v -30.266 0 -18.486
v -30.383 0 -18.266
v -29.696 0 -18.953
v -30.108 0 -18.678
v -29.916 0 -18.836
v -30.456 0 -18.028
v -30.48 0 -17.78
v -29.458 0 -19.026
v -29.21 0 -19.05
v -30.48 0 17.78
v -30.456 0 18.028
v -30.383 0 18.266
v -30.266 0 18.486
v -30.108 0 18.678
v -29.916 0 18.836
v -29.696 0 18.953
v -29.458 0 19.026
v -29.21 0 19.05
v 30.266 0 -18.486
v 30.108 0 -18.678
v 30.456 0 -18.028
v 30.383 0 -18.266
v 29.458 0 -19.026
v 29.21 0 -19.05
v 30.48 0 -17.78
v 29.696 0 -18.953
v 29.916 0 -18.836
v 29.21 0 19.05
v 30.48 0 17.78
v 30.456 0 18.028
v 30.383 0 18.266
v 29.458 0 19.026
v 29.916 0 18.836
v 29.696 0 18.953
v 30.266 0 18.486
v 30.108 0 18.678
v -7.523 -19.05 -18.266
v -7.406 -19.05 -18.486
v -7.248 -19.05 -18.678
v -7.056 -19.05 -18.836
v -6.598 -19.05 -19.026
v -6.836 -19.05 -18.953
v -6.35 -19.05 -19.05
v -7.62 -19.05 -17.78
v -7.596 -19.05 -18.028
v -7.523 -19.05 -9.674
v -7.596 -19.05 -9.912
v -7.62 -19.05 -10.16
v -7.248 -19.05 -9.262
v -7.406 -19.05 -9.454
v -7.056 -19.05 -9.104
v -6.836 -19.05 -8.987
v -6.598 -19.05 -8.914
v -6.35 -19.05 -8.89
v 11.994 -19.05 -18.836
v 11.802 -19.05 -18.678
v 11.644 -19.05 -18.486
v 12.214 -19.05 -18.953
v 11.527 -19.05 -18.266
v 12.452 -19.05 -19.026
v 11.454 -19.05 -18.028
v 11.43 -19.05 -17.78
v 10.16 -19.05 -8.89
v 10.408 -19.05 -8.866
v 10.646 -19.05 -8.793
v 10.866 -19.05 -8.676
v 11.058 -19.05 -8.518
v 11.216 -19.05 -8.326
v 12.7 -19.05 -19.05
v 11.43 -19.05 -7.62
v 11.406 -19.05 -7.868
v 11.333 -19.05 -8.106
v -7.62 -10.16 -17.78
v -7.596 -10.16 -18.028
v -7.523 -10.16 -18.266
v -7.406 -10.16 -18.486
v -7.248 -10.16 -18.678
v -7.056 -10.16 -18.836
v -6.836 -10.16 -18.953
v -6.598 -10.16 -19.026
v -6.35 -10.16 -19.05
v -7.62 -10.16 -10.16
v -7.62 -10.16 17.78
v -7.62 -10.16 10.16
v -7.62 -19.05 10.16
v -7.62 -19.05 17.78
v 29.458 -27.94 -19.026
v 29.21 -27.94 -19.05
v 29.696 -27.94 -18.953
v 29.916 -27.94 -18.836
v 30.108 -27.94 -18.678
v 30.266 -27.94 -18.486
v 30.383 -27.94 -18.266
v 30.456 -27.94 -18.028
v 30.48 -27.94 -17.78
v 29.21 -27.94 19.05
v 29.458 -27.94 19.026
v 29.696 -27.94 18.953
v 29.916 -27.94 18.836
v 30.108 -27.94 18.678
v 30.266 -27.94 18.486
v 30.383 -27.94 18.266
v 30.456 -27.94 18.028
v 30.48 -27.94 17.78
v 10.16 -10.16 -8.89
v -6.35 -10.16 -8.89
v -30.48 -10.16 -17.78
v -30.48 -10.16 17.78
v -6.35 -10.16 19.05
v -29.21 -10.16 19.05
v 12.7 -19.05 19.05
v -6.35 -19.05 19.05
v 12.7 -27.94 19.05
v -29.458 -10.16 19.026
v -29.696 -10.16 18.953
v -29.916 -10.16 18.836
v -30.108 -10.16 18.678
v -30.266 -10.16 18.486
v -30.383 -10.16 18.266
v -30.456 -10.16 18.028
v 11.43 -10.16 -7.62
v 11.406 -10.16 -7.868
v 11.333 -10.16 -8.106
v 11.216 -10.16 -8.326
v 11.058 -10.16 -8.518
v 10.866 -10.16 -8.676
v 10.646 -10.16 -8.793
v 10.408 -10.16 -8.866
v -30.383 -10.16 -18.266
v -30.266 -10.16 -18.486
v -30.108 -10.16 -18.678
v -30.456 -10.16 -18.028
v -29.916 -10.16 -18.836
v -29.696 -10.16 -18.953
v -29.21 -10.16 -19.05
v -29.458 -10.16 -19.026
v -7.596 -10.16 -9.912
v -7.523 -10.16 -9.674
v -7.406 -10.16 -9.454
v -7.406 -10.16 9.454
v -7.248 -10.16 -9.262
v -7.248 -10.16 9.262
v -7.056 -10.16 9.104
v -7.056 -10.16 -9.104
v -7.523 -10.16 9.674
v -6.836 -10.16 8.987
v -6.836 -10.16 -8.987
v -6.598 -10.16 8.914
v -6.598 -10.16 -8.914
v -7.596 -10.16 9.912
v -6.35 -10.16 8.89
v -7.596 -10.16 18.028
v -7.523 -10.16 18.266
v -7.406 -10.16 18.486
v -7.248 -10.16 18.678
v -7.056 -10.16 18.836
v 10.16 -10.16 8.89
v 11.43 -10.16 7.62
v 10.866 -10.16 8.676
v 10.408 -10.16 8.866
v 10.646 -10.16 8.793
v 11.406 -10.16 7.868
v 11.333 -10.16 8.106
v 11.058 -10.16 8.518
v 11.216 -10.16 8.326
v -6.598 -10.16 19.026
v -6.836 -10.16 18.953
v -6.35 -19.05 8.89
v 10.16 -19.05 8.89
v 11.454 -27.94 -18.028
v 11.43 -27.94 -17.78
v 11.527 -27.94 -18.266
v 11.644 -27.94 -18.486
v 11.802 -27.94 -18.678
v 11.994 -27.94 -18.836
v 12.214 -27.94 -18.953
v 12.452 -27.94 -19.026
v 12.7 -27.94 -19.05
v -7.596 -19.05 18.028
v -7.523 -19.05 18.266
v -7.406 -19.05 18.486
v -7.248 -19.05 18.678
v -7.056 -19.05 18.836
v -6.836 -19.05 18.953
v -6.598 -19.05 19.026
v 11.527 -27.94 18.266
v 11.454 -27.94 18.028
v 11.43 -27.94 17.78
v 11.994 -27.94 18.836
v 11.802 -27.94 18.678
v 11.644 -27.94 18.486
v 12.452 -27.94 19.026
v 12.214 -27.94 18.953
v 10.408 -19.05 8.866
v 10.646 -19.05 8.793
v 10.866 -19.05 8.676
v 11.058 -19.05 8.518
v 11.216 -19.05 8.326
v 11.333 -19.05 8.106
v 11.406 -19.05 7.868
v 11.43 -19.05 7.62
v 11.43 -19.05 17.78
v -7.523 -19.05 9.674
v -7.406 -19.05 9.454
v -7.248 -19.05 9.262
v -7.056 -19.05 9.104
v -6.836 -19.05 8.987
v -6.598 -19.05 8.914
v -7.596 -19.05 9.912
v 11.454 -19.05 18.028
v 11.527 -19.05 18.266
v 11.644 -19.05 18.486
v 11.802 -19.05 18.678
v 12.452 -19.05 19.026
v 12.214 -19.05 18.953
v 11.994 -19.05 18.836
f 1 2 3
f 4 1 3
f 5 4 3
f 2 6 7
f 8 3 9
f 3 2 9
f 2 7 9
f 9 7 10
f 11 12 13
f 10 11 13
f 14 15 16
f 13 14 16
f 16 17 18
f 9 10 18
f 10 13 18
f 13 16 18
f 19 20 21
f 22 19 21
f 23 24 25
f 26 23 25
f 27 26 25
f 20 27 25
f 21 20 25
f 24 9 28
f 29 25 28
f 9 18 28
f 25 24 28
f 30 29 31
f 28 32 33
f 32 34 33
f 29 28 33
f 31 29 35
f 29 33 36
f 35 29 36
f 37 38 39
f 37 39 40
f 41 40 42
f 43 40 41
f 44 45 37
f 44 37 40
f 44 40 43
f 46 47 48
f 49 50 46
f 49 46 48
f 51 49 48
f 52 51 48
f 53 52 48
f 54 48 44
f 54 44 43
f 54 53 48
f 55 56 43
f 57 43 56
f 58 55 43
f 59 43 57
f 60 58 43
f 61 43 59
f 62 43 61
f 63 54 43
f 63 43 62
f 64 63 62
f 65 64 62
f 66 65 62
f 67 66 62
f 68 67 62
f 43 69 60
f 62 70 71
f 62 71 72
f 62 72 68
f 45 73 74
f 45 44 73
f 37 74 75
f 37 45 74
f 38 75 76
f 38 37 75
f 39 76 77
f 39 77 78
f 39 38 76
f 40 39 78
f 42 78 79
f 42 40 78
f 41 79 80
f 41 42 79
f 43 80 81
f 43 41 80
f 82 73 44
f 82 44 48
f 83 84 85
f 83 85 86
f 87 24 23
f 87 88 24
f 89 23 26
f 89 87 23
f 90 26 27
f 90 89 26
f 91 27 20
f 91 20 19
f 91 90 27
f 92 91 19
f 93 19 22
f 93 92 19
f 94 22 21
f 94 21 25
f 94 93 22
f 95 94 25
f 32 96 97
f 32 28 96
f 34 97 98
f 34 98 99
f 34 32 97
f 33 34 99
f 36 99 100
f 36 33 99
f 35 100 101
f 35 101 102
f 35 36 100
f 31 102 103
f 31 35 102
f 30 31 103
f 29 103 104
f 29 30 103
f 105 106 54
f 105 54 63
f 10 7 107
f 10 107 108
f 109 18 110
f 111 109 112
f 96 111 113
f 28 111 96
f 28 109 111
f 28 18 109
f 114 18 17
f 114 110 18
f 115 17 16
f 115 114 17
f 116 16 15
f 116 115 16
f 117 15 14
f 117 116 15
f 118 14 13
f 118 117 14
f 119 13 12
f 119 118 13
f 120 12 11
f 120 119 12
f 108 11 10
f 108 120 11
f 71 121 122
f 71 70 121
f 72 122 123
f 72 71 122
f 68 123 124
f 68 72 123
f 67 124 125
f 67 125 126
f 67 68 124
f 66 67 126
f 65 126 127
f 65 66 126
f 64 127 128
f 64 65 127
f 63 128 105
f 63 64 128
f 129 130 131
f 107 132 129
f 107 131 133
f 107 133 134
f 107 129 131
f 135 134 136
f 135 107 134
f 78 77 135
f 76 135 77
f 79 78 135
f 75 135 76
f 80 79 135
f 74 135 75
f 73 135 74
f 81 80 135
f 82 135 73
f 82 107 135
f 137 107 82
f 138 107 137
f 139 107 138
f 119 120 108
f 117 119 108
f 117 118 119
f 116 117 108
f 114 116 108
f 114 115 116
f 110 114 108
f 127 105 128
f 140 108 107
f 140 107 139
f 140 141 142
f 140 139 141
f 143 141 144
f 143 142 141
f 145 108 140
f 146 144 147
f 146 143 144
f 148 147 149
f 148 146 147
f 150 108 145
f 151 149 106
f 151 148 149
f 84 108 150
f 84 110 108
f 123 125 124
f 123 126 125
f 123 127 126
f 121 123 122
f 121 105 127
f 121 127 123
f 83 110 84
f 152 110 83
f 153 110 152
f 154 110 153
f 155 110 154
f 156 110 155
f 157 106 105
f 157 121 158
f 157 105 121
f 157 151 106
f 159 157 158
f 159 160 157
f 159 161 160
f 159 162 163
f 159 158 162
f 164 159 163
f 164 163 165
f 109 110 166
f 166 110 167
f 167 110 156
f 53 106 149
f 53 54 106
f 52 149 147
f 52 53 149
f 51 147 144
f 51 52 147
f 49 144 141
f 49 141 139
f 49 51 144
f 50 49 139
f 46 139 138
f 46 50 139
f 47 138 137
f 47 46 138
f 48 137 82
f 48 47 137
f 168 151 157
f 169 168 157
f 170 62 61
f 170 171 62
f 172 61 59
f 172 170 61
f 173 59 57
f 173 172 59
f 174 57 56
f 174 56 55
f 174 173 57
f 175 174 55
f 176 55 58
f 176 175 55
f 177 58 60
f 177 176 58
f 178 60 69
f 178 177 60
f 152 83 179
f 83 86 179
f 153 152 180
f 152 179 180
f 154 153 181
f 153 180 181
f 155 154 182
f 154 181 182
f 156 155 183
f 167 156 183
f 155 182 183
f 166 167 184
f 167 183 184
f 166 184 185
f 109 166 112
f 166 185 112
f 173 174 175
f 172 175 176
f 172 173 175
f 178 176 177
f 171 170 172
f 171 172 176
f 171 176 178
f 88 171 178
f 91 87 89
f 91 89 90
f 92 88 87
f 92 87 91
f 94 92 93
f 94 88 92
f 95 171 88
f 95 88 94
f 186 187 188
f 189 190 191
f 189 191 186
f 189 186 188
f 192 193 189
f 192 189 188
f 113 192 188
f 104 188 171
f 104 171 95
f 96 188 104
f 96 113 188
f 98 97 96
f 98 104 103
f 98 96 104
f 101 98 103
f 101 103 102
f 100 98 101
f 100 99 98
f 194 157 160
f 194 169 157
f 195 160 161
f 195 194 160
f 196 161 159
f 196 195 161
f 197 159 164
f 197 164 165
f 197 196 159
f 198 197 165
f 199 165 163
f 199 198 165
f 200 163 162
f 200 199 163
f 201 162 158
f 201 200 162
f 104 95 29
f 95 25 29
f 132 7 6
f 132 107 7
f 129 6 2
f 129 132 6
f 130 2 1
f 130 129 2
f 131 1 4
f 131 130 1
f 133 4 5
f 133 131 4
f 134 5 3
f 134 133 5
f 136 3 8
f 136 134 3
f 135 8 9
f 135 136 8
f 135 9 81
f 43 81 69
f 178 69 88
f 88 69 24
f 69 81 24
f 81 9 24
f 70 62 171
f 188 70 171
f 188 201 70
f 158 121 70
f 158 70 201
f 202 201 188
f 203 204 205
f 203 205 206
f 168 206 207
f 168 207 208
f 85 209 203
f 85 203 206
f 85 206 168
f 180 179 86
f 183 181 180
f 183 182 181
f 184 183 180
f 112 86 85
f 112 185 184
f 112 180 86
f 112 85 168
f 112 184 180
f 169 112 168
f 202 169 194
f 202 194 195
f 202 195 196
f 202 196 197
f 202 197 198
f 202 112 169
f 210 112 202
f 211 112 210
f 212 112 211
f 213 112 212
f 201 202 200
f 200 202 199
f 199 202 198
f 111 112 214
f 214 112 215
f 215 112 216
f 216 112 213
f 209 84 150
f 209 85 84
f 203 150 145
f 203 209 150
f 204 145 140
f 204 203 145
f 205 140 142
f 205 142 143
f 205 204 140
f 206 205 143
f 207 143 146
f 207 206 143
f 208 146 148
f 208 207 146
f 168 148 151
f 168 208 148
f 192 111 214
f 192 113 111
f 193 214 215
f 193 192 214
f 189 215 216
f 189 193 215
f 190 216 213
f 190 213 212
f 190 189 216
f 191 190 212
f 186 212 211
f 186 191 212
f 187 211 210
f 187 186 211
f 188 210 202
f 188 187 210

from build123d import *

# Parameters (mm, degrees)
F0_W     = 60.96
F0_H     = 38.1
F1_DEPTH = 10.16
F2_W     = 19.05
F2_H     = 38.1
F3_DEPTH = 17.78
F4_W     = 19.05
F4_H     = 10.16
F5_DEPTH = 8.89
F6_R     = 1.27


with BuildPart() as f1:
    # F0 (on Front) → F1 (new body)
    with BuildSketch(Plane.XZ):
        Rectangle(F0_W, F0_H)
    extrude(amount=F1_DEPTH)

    # F2 (on face) → F3 (join)
    with BuildSketch(Plane.XZ.offset(10.16)):
        with Locations((20.955, 0)):
            Rectangle(F2_W, F2_H)
    extrude(amount=F3_DEPTH)

    # F4 (on face) → F5 (join)
    with BuildSketch(Plane.XZ.offset(10.16)):
        with Locations((1.905, 13.97)):
            Rectangle(F4_W, F4_H)
        with Locations((1.905, -13.97)):
            Rectangle(F4_W, F4_H)
    extrude(amount=F5_DEPTH)

    # F6
    f6_edges = [f1.edges().sort_by_distance(p)[0] for p in [
        (-30.48, -5.08, 19.05),
        (-30.48, -5.08, -19.05),
        (-7.62, -14.605, 19.05),
        (-7.62, -14.605, 8.89),
        (-7.62, -14.605, -8.89),
        (-7.62, -14.605, -19.05),
        (11.43, -23.495, -19.05),
        (11.43, -23.495, 19.05),
        (30.48, -13.97, 19.05),
        (30.48, -13.97, -19.05),
        (11.43, -14.605, -8.89),
        (11.43, -14.605, 8.89),
    ]]
    fillet(f6_edges, radius=F6_R)


solid = f1.part
